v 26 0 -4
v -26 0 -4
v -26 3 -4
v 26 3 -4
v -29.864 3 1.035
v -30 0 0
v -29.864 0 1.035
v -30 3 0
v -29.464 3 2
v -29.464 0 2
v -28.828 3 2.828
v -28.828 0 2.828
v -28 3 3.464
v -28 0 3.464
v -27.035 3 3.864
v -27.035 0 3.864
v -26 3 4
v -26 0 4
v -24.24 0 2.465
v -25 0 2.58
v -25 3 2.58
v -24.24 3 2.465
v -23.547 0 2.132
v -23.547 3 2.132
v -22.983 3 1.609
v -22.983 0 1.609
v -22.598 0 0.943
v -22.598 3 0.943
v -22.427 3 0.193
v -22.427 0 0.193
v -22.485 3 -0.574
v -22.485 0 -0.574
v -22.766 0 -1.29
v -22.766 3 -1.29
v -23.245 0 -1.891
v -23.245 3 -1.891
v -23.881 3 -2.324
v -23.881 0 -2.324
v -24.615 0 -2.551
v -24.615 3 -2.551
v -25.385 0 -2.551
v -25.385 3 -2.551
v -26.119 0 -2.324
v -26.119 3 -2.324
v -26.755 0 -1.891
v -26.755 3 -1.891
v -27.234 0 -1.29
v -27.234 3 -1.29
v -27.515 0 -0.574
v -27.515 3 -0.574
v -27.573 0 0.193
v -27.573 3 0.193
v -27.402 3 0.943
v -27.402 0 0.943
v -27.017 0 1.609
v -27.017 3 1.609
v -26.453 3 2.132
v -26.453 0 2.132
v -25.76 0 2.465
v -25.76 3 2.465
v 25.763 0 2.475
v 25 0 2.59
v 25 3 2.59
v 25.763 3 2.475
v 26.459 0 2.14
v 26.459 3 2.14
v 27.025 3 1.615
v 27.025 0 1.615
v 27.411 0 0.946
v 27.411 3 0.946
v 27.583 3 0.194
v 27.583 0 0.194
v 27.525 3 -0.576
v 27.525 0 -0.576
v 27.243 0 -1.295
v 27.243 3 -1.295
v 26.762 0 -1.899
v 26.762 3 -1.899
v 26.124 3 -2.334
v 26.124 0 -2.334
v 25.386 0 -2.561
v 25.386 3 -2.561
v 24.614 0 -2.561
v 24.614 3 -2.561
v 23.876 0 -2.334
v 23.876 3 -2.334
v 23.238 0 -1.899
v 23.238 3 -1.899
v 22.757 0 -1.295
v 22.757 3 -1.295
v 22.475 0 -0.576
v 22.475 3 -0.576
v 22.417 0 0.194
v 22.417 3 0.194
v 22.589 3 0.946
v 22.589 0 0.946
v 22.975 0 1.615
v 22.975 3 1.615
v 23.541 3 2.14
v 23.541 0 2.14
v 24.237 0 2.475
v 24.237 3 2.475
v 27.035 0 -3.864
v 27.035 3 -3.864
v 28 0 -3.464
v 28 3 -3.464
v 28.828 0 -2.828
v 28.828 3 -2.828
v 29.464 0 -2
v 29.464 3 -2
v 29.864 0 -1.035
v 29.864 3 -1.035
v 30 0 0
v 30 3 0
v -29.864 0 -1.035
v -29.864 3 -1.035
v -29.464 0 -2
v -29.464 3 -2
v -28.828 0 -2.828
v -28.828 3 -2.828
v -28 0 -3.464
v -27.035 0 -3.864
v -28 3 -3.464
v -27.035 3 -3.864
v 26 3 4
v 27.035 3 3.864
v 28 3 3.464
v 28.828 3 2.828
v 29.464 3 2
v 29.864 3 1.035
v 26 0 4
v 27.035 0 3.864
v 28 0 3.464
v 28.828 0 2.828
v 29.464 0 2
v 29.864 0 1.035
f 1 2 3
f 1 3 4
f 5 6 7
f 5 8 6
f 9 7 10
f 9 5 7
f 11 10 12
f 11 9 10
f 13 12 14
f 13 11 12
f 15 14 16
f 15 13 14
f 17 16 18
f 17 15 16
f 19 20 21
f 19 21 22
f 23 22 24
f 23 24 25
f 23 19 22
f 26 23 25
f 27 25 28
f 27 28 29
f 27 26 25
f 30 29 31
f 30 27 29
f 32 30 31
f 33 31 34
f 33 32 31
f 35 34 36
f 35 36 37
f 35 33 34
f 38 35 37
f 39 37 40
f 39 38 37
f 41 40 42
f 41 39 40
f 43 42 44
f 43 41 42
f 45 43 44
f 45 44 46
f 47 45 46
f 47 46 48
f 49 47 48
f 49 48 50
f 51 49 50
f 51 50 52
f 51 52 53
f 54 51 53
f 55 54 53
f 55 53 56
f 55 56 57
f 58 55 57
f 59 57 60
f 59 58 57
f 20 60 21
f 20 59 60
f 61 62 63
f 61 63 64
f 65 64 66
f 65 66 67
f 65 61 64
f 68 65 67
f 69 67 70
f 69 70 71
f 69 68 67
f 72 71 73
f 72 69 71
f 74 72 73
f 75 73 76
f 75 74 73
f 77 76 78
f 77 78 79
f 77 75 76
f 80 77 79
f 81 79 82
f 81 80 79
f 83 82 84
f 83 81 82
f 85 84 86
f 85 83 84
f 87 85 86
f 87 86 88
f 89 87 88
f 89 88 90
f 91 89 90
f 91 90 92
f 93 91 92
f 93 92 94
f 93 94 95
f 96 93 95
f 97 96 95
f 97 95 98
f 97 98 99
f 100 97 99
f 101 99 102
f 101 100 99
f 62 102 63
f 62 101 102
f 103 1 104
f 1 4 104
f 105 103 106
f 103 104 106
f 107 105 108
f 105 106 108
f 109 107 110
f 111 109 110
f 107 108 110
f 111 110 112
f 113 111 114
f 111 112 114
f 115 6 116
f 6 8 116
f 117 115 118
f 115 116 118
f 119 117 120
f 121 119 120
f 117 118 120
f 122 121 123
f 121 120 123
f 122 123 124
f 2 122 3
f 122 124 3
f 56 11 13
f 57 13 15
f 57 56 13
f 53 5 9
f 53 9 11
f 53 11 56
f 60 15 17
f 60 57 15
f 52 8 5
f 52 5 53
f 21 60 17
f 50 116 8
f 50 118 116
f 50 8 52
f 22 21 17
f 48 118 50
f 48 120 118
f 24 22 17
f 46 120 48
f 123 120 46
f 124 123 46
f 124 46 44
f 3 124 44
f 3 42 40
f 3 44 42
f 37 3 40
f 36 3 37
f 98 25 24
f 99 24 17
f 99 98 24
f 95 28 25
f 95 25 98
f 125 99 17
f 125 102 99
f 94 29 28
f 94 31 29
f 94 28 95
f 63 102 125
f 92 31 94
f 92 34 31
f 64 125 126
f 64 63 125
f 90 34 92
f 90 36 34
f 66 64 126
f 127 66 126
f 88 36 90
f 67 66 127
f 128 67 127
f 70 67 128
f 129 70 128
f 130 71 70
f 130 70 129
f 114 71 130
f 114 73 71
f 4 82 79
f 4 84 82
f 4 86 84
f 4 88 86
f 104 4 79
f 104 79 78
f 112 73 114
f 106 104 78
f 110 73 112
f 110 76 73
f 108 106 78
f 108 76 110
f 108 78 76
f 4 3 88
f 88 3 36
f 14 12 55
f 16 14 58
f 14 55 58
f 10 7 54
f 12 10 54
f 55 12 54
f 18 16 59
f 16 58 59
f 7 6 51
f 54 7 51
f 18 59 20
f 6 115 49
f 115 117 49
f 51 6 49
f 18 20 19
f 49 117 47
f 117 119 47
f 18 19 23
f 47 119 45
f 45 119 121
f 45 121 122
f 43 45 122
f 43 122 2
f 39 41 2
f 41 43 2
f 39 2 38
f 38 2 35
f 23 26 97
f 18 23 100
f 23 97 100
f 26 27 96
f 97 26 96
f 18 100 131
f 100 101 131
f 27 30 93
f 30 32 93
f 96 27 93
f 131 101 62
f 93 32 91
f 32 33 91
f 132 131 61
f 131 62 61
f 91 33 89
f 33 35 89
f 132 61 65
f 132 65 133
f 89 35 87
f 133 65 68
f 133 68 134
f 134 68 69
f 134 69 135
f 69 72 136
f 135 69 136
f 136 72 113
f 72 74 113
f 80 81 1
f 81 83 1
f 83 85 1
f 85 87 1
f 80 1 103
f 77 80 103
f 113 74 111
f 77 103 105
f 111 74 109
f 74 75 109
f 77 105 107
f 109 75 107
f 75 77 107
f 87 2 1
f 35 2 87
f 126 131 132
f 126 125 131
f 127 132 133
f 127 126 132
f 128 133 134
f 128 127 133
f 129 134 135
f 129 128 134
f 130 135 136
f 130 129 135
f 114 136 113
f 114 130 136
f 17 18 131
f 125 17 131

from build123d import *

# Parameters (mm, degrees)
SKETCH1_W           = 60
SKETCH1_H           = 8
SKETCH1_R           = 2.58
SKETCH1_R_2         = 2.59
BOSS_EXTRUDE1_DEPTH = 3
REDONDEO2_R         = 4


with BuildPart() as part:
    # Sketch1 → Boss-Extrude1 (new body)
    with BuildSketch(Plane(origin=(0, 0, 0), x_dir=(1, 0, 0), z_dir=(0, 1, 0))):
        Rectangle(SKETCH1_W, SKETCH1_H)
        with Locations(Location((-25, 0, 0), (0, 0, 270))):
            Circle(SKETCH1_R, mode=Mode.SUBTRACT)
        with Locations(Location((25, 0, 0), (0, 0, 270))):
            Circle(SKETCH1_R_2, mode=Mode.SUBTRACT)
    extrude(amount=BOSS_EXTRUDE1_DEPTH)

    # Redondeo2
    redondeo2_edges = [part.edges().sort_by_distance(p)[0] for p in [
        (30, 1.5, -4),
        (30, 1.5, 4),
        (-30, 1.5, -4),
        (-30, 1.5, 4),
    ]]
    fillet(redondeo2_edges, radius=REDONDEO2_R - 0.0001)  # a hair under: the kernel refuses the full size


solid = part.part
